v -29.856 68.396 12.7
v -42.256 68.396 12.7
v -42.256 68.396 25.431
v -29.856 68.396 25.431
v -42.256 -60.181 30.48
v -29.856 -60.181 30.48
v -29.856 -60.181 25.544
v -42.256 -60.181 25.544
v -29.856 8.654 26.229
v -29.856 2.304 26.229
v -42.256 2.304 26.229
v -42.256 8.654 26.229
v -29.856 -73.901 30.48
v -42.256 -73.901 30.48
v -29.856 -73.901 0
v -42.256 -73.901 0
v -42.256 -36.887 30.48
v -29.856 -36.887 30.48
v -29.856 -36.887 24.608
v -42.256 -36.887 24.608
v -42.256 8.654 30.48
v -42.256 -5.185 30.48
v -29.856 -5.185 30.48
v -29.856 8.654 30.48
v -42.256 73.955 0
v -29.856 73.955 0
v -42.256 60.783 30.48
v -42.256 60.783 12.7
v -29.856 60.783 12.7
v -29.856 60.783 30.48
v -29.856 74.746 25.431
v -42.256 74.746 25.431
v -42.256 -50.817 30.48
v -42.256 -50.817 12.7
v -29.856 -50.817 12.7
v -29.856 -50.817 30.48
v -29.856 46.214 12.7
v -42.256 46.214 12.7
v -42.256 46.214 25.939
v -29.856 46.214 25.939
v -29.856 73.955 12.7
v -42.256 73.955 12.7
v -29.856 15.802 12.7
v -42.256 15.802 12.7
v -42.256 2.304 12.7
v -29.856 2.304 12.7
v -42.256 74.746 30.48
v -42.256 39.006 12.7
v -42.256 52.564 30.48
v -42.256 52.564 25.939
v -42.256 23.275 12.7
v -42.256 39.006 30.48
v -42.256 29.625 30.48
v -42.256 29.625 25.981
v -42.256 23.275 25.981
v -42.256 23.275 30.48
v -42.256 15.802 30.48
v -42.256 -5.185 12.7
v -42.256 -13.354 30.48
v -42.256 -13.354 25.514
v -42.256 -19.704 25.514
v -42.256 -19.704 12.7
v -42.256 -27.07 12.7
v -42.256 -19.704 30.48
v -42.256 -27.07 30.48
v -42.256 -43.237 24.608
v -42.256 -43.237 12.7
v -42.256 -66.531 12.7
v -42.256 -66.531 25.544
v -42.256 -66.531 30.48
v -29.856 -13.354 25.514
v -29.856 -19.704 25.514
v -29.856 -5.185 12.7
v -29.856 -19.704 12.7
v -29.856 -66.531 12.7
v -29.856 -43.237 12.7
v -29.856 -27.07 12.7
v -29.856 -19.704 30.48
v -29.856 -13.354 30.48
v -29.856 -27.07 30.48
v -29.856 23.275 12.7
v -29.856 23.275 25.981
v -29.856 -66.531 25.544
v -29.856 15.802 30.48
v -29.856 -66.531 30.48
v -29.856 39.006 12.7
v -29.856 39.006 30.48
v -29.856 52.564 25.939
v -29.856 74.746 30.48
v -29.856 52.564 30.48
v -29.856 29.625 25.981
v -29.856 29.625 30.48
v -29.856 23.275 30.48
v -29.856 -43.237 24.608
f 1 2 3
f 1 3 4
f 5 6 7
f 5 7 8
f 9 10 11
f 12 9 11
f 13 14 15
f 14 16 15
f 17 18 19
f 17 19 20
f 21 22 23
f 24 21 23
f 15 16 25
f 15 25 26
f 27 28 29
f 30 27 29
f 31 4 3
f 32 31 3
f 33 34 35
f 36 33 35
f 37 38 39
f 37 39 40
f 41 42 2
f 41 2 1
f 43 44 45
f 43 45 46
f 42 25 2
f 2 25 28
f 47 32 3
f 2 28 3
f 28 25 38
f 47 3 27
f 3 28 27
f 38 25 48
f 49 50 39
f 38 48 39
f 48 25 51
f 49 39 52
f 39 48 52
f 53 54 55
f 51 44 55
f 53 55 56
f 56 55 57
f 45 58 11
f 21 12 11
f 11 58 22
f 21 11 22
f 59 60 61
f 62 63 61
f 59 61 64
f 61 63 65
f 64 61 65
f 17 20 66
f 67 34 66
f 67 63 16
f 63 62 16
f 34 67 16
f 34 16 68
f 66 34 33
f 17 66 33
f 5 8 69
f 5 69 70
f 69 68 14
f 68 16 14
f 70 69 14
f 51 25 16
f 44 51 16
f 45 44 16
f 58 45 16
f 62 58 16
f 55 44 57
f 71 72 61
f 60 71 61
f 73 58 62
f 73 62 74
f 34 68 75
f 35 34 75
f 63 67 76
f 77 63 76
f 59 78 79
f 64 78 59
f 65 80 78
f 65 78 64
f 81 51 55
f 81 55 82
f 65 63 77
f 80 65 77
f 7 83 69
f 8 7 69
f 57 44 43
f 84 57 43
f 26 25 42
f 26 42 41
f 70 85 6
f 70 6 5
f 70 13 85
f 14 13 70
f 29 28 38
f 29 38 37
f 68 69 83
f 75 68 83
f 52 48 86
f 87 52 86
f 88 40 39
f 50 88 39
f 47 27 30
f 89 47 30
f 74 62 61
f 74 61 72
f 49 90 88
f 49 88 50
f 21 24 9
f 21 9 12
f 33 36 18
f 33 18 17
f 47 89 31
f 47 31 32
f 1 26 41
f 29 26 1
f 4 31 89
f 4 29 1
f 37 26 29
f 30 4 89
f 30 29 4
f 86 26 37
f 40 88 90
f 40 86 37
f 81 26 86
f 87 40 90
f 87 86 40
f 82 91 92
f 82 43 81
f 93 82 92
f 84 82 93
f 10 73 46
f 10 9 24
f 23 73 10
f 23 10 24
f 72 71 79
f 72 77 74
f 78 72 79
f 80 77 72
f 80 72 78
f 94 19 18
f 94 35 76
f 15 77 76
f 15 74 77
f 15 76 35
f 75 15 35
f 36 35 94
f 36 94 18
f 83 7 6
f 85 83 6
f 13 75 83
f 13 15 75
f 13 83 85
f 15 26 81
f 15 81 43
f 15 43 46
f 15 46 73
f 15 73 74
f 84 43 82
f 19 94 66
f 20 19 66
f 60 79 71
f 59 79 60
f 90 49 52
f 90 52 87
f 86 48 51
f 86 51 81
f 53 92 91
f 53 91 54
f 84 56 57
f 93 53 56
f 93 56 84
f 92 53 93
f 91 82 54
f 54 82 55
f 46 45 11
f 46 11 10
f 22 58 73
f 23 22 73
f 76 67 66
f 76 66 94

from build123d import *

# Parameters (mm, degrees)
F0_W      = 12.4007742852
F0_H      = 147.8563919663
F1_DEPTH  = 12.7
F2_W      = 12.4007742852
F2_H      = 7.5796097517
F2_H_2    = 7.3651988059
F2_H_3    = 7.48882466
F2_H_4    = 7.4724052101
F2_H_5    = 7.208738476
F2_H_6    = 7.6124407351
F2_H_7    = 7.3697865009
F3_DEPTH  = 17.78
F4_W      = 12.4007742852
F4_H      = 4.9358203965
F5_DEPTH  = 6.35
F6_W      = 12.4007742852
F6_H      = 5.8721274096
F8_W      = 12.4007742852
F8_H      = 4.2509499896
F9_W      = 12.4007742852
F9_H      = 4.4994622427
F10_W     = 12.4007742852
F10_H     = 4.5405410188
F11_W     = 12.4007742852
F11_H     = 5.0489034462
F12_DEPTH = 6.35
F7_W      = 12.4007742852
F7_H      = 4.9657884943
F13_DEPTH = 6.35


with BuildPart() as f1:
    # F0 (on Top) → F1 (new body)
    with BuildSketch(Plane.XY):
        with Locations((-36.0559495166, 0.0271089375)):
            Rectangle(F0_W, F0_H)
    extrude(amount=F1_DEPTH)

    # F2 (on face) → F3 (join)
    with BuildSketch(Plane.XY.offset(12.7)):
        with Locations((-36.0559495166, -47.0269694924)):
            Rectangle(F2_W, F2_H)
        with Locations((-36.0559495166, -23.3870735392)):
            Rectangle(F2_W, F2_H_2)
        with Locations((-36.0559495166, -1.4402301749)):
            Rectangle(F2_W, F2_H_3)
        with Locations((-36.0559495166, 19.5383997634)):
            Rectangle(F2_W, F2_H_4)
        with Locations((-36.0559495166, 42.6099169999)):
            Rectangle(F2_W, F2_H_5)
        with Locations((-36.0559495166, 64.5896028727)):
            Rectangle(F2_W, F2_H_6)
        with Locations((-36.0559495166, -70.2161937952)):
            Rectangle(F2_W, F2_H_7)
    extrude(amount=F3_DEPTH)

    # F4 (on face) → F5 (join)
    with BuildSketch(Plane(origin=(0, -66.5313005447, 0), x_dir=(-1, 0, 0), z_dir=(0, 1, 0))):
        with Locations((36.0559495166, 28.0120898017)):
            Rectangle(F4_W, F4_H)
    extrude(amount=F5_DEPTH)

    # F6 (on face) + F8 (on face) + F9 (on face) + F10 (on face) + F11 (on face) → F12 (join)
    with BuildSketch(Plane(origin=(0, -43.2371646166, 0), x_dir=(-1, 0, 0), z_dir=(0, 1, 0))):
        with Locations((36.0559495166, 27.5439362952)):
            Rectangle(F6_W, F6_H)
    with BuildSketch(Plane(origin=(0, 2.3041821551, 0), x_dir=(-1, 0, 0), z_dir=(0, 1, 0))):
        with Locations((36.0559495166, 28.3545250052)):
            Rectangle(F8_W, F8_H)
    with BuildSketch(Plane(origin=(0, 23.2746023685, 0), x_dir=(-1, 0, 0), z_dir=(0, 1, 0))):
        with Locations((36.0559495166, 28.2302688786)):
            Rectangle(F9_W, F9_H)
    with BuildSketch(Plane(origin=(0, 46.214286238, 0), x_dir=(-1, 0, 0), z_dir=(0, 1, 0))):
        with Locations((36.0559495166, 28.2097294906)):
            Rectangle(F10_W, F10_H)
    with BuildSketch(Plane(origin=(0, 68.3958232403, 0), x_dir=(-1, 0, 0), z_dir=(0, 1, 0))):
        with Locations((36.0559495166, 27.9555482769)):
            Rectangle(F11_W, F11_H)
    extrude(amount=F12_DEPTH)

    # F7 (on face) → F13 (join)
    with BuildSketch(Plane(origin=(0, -19.7044741362, 0), x_dir=(-1, 0, 0), z_dir=(0, 1, 0))):
        with Locations((36.0559495166, 27.9971057528)):
            Rectangle(F7_W, F7_H)
    extrude(amount=F13_DEPTH)


solid = f1.part
